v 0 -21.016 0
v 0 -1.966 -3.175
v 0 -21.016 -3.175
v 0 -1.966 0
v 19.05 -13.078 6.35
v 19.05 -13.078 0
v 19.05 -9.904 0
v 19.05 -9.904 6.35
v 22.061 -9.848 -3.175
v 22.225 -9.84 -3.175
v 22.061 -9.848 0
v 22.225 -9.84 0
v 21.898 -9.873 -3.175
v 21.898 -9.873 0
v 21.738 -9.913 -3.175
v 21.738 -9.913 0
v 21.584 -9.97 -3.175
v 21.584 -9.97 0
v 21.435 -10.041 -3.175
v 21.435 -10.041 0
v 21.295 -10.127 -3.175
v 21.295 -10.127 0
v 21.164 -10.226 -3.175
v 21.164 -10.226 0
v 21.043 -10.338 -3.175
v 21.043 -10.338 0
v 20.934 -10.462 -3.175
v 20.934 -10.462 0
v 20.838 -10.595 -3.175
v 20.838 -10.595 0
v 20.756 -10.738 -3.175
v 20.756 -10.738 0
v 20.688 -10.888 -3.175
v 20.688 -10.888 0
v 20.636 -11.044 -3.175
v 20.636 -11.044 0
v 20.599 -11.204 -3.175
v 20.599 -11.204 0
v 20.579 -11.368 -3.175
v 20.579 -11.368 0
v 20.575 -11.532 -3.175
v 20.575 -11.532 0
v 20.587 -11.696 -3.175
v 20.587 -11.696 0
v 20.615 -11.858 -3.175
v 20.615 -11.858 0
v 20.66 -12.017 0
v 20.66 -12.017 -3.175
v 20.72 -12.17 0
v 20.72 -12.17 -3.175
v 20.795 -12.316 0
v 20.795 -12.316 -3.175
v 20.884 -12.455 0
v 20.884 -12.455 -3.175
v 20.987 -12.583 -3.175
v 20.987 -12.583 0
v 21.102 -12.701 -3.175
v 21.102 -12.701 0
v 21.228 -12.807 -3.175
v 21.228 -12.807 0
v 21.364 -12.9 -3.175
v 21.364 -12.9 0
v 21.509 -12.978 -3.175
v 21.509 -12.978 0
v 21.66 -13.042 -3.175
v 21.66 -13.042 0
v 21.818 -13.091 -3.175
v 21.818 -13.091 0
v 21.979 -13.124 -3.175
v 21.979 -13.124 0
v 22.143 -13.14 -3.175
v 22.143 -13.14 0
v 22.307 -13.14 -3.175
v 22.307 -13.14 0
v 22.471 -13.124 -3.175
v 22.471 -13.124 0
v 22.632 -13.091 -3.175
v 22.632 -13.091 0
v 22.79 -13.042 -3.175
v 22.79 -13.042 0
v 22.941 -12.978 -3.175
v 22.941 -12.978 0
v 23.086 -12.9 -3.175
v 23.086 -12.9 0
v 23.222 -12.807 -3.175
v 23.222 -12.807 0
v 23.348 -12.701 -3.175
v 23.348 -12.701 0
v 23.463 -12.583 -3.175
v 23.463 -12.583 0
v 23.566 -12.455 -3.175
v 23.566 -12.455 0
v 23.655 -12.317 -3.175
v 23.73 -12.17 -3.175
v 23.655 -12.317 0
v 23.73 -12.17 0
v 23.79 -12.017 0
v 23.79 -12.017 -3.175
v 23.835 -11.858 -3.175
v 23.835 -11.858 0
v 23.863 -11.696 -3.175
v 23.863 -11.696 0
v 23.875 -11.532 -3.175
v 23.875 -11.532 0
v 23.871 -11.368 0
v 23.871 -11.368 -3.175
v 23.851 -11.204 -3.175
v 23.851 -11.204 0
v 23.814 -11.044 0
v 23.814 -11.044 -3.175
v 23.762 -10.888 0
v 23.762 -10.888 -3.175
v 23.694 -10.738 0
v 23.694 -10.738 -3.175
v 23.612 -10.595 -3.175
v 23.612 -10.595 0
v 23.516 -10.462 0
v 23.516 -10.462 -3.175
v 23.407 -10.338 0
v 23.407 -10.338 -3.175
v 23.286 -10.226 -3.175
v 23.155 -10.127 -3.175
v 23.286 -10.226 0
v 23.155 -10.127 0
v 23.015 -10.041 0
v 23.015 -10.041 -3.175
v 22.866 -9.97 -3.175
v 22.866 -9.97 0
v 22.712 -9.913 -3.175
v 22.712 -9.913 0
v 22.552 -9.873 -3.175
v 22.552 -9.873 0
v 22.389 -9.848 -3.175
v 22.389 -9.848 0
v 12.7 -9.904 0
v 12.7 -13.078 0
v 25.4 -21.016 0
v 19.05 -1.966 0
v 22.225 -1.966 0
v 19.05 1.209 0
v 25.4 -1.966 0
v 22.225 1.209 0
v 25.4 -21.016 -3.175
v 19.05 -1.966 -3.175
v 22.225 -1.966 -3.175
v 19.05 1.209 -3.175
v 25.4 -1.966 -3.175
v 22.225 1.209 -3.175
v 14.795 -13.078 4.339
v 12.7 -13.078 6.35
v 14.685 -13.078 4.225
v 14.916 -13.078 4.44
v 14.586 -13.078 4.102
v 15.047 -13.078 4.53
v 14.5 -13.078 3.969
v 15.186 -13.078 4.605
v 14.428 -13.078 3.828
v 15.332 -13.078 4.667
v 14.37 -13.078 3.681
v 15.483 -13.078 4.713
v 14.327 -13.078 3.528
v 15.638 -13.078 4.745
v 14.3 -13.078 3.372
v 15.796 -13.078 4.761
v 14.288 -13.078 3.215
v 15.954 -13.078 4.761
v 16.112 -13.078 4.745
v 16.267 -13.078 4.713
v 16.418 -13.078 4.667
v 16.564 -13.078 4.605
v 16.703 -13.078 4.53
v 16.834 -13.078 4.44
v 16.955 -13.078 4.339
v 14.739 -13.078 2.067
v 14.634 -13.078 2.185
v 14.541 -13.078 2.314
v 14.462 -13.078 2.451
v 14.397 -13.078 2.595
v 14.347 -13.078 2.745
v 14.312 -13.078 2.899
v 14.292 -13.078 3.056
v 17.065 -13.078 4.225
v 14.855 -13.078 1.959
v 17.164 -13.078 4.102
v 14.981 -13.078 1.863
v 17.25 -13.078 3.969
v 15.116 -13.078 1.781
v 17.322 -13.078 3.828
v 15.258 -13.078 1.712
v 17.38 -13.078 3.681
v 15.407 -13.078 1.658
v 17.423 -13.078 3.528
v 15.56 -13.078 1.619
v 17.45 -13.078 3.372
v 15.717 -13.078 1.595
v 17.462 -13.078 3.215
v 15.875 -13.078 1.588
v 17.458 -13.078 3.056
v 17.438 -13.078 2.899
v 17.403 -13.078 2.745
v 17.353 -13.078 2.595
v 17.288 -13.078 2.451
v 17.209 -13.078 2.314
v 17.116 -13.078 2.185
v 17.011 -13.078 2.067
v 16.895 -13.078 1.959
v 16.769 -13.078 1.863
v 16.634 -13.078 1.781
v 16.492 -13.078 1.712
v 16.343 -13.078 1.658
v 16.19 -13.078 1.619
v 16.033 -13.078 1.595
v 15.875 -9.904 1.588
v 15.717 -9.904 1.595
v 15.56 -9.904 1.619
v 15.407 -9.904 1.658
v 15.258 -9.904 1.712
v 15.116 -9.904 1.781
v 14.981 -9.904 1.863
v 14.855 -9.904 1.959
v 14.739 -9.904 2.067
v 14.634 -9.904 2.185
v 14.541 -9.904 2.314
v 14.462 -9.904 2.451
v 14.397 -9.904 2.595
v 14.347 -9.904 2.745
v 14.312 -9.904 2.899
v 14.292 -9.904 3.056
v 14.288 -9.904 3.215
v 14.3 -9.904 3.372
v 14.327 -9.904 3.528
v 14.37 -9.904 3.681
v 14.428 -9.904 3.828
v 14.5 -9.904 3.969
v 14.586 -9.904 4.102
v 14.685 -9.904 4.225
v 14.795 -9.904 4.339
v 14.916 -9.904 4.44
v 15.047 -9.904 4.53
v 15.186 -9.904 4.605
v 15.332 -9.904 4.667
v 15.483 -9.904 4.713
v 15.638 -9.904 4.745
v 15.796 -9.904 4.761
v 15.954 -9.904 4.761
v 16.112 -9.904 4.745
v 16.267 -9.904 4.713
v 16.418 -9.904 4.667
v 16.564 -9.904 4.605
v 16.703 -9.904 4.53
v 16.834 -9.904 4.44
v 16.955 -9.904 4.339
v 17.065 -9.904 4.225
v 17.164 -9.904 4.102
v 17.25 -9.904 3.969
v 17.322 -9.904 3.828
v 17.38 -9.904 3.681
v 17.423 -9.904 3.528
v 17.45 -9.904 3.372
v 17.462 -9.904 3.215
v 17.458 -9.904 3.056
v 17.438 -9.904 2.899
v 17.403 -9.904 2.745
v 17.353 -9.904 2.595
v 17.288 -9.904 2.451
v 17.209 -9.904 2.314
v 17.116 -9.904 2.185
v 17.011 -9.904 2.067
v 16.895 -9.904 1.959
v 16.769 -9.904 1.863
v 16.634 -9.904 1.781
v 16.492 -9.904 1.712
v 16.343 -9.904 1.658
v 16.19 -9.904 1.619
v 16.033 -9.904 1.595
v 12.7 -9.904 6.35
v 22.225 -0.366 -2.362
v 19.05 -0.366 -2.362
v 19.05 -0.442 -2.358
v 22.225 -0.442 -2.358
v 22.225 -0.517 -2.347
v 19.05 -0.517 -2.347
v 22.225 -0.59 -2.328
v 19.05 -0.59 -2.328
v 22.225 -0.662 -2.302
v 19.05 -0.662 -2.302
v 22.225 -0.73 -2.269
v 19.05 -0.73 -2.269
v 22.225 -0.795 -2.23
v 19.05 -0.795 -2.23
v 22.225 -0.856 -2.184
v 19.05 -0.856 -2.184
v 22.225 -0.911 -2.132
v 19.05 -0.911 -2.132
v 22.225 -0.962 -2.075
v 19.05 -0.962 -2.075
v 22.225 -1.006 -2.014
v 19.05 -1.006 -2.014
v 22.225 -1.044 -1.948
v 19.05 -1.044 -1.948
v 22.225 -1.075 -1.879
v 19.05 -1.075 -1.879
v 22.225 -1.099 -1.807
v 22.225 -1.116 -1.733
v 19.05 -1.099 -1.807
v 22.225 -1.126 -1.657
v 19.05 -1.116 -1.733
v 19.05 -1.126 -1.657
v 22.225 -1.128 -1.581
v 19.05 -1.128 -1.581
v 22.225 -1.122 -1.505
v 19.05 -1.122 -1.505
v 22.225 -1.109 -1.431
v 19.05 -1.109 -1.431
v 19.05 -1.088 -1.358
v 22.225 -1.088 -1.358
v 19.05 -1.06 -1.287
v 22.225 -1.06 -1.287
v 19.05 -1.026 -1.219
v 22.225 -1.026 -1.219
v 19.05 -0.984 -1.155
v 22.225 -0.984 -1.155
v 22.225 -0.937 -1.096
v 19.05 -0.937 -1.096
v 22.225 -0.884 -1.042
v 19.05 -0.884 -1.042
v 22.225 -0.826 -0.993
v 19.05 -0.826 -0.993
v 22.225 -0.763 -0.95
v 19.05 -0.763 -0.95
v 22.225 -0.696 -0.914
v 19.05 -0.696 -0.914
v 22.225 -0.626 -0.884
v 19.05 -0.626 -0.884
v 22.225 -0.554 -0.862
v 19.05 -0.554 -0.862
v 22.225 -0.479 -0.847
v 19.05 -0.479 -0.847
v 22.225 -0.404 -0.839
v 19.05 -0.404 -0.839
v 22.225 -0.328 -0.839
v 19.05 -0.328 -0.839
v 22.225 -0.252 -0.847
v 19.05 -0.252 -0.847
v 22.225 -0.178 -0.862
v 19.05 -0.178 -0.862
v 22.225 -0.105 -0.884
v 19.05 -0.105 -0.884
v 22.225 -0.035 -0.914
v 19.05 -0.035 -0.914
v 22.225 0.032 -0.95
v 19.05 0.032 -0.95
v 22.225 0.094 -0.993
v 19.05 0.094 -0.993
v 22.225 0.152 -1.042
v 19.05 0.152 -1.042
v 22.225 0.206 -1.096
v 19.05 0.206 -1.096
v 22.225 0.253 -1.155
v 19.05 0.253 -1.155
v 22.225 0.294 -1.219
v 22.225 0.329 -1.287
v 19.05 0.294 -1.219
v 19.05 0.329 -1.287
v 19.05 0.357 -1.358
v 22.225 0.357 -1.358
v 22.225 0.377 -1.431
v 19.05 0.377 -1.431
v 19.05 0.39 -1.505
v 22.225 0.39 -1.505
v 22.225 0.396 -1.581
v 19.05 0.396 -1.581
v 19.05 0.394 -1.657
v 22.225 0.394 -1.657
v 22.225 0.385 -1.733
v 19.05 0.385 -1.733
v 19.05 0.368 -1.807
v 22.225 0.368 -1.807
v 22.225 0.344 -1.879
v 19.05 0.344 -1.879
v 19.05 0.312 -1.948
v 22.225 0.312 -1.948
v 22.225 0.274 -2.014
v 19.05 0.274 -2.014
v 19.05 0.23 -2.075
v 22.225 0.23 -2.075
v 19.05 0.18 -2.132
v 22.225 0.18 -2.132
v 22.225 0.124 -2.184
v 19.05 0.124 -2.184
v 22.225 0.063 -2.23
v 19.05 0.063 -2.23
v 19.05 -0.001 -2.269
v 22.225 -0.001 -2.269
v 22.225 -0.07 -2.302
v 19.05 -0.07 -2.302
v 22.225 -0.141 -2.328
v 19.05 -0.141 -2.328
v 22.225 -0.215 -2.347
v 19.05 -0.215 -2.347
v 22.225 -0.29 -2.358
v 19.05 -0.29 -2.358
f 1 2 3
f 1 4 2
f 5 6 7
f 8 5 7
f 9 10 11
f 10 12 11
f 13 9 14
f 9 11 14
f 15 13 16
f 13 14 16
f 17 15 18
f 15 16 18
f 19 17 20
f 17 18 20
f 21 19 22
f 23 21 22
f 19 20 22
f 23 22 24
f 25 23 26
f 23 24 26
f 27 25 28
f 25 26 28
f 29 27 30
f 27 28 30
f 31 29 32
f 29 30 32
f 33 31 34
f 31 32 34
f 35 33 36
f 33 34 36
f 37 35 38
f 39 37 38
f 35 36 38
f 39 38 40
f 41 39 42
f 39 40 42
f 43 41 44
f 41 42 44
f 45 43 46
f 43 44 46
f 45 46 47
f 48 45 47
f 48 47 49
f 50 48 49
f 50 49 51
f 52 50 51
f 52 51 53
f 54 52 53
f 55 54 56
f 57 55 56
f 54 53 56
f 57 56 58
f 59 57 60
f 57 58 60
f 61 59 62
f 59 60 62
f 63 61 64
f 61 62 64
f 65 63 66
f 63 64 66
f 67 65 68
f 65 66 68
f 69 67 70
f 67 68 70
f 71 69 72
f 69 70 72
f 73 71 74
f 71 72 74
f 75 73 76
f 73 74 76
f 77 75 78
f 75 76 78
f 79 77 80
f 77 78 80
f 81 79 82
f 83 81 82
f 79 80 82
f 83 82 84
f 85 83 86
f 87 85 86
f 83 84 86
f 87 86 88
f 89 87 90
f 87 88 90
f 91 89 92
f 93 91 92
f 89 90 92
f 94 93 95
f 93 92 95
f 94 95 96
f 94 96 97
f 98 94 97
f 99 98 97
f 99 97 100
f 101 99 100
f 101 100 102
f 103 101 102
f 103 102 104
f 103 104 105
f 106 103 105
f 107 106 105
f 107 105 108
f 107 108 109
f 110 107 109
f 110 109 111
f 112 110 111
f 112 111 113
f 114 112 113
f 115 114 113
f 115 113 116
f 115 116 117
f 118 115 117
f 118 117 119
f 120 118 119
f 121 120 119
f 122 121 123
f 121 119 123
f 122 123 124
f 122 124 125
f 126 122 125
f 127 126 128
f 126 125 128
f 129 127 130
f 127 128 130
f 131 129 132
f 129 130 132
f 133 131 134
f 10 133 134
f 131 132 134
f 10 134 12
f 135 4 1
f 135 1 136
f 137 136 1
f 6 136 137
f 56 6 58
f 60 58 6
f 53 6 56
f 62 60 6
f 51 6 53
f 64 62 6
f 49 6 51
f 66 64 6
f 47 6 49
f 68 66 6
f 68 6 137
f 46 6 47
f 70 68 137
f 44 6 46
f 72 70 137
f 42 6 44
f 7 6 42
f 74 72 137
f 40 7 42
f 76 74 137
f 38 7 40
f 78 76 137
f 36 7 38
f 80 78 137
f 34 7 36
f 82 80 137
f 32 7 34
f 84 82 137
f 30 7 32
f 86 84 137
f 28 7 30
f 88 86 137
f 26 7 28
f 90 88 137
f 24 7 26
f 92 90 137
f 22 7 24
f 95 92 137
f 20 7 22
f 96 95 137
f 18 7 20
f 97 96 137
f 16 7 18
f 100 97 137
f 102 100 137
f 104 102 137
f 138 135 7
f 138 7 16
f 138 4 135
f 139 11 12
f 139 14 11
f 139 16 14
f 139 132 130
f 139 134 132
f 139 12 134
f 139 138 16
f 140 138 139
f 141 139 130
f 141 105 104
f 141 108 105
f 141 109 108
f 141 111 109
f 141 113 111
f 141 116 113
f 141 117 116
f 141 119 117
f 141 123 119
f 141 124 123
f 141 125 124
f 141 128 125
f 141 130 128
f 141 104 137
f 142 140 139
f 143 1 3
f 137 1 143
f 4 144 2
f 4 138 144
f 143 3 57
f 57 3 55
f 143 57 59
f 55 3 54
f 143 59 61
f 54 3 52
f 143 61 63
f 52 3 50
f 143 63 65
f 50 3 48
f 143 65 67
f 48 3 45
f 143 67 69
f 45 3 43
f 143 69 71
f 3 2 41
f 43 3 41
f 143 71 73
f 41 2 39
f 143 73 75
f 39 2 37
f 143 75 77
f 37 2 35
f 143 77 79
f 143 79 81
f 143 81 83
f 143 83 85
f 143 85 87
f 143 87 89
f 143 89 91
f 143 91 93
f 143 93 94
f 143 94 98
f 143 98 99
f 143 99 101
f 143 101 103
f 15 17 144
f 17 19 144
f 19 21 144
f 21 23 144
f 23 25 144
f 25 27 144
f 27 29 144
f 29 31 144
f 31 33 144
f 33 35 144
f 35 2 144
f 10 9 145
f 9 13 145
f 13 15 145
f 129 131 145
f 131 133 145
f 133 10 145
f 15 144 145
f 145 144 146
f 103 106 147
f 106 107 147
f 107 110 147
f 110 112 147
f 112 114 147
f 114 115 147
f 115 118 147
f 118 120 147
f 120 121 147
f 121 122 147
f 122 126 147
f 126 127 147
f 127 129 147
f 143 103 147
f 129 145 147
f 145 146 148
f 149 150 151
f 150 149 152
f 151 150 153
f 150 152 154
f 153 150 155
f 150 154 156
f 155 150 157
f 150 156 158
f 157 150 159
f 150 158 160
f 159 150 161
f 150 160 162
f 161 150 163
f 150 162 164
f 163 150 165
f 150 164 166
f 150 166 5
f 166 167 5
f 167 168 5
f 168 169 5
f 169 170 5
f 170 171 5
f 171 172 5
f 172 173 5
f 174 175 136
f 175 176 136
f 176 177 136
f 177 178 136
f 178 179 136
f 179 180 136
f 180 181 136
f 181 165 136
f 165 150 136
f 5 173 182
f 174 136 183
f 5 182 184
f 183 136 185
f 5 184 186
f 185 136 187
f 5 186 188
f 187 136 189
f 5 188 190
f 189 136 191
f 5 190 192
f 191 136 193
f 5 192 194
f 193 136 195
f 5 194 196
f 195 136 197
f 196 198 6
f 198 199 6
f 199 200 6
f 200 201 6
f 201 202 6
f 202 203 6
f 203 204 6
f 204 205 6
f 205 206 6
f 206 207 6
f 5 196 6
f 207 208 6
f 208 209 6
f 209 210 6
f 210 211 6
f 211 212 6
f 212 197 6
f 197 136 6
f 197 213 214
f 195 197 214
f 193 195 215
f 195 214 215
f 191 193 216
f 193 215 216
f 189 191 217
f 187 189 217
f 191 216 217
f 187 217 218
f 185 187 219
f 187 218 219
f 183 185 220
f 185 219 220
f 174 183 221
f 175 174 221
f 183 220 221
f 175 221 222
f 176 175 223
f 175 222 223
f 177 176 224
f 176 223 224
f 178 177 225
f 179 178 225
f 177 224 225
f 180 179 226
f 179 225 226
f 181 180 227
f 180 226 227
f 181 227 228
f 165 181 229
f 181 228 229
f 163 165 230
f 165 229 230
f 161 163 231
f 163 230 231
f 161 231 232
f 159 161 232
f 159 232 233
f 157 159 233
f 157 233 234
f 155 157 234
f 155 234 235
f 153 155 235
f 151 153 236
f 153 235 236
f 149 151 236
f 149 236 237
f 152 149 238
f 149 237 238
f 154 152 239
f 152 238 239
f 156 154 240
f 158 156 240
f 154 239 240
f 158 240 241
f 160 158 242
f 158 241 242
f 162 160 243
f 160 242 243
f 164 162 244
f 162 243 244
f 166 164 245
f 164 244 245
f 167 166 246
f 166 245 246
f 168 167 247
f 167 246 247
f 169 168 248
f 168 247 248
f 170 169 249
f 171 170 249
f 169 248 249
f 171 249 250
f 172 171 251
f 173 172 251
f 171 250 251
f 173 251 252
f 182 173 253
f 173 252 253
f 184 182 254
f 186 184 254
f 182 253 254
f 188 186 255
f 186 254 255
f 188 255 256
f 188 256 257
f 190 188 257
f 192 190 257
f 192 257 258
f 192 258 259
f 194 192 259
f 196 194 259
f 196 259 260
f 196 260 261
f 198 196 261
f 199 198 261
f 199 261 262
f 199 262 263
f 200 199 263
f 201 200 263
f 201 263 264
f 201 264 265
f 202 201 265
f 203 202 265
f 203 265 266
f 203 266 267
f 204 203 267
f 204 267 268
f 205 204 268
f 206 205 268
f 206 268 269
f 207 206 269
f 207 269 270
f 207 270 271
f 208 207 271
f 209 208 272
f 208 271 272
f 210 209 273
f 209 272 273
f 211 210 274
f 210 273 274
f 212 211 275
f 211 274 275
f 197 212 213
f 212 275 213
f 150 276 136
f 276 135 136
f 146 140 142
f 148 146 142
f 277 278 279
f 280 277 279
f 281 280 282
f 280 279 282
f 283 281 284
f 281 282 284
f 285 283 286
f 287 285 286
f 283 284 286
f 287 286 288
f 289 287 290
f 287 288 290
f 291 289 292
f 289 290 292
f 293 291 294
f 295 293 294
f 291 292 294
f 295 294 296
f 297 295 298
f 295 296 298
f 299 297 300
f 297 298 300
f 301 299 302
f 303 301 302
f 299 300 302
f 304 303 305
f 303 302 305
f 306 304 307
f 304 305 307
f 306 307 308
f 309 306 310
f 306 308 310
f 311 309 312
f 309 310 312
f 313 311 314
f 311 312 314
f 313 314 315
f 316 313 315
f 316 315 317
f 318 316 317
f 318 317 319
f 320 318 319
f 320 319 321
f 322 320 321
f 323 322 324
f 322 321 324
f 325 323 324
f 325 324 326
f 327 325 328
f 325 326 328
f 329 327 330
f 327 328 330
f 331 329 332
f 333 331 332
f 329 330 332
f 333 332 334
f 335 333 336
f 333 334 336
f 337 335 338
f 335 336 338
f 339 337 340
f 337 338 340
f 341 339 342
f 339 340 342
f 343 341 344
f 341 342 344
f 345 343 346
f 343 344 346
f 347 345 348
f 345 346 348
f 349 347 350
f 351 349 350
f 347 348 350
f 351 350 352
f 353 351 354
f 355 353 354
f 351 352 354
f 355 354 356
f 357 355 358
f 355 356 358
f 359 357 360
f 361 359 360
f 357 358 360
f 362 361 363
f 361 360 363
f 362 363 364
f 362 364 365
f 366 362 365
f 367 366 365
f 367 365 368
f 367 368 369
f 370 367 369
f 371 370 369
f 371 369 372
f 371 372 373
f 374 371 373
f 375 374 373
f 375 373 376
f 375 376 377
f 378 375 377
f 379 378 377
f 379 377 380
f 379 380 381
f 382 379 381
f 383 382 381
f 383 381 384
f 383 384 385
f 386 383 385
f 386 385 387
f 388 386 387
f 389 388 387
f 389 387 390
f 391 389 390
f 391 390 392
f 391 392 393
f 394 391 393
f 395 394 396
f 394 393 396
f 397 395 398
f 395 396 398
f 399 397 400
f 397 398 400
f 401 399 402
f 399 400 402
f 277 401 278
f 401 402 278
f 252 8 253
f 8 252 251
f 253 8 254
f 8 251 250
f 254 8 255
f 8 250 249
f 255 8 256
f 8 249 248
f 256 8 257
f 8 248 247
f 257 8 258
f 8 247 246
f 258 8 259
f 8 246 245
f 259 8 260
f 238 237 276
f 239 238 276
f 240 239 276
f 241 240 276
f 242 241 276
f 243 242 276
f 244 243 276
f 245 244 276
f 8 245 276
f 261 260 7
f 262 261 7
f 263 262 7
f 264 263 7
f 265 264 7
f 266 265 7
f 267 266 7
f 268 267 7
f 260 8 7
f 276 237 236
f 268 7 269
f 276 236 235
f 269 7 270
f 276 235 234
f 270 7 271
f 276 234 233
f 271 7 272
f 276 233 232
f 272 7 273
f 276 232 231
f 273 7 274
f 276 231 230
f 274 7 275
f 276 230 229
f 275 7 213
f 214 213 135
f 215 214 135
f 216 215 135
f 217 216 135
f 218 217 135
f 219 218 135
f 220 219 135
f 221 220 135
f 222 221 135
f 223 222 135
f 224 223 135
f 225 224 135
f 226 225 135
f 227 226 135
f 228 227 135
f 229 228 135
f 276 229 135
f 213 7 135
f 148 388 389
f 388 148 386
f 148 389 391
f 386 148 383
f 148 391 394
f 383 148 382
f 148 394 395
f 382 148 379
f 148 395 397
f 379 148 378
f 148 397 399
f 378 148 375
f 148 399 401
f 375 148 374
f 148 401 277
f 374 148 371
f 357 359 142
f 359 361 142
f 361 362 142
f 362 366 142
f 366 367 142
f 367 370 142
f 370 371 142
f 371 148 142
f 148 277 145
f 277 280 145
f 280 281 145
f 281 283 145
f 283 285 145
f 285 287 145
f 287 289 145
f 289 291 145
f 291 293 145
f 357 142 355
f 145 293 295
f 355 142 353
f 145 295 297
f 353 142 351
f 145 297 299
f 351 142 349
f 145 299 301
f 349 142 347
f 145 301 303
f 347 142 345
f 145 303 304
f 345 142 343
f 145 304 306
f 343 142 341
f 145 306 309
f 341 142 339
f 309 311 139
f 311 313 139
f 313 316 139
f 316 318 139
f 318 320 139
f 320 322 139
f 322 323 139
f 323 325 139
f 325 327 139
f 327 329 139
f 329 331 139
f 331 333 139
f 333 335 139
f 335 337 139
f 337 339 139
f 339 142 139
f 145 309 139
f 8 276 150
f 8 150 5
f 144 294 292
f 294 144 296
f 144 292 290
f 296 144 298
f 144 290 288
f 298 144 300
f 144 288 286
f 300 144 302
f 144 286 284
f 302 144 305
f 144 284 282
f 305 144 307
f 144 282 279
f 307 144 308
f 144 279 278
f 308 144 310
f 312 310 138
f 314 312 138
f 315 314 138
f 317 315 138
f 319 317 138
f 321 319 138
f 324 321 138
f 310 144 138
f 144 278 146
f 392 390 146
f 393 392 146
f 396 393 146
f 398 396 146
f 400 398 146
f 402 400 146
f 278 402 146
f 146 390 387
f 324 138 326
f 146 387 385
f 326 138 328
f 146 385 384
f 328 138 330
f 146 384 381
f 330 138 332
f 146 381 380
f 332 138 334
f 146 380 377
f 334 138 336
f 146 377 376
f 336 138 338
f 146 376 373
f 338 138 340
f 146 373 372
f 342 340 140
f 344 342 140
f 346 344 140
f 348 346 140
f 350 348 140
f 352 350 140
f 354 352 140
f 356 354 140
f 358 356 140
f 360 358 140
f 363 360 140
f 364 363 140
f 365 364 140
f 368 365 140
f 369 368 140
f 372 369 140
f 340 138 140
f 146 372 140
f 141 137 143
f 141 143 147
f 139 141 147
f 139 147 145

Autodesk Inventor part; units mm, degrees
ref_plane "YZ Plane" through (0, 0, 0) normal (1, 0, 0) x (0, 1, 0)
ref_plane "XZ Plane" through (0, 0, 0) normal (0, 1, 0) x (-1, 0, 0)
ref_plane "XY Plane" through (0, 0, 0) normal (0, 0, 1) x (1, 0, 0)
sketch "Sketch1" plane through (0, 0, 0) normal (0, 0, 1) x (1, 0, 0)
  line L0 (0, -21.016) -> (25.4, -21.016)
  line L1 (25.4, -21.016) -> (25.4, -1.966)
  line L2 (0, -1.966) -> (0, -21.016)
  line L3 (19.05, -1.966) -> (19.05, 15.687)
  line L4 (19.05, 15.687) -> (22.225, 15.687)
  line L5 (22.225, 15.687) -> (22.225, -1.966)
  line L6 (25.4, -1.966) -> (22.225, -1.966)
  line L7 (19.05, -1.966) -> (0, -1.966)
  dimension "d0" = 19.05
  dimension "d2" = 25.4
  dimension "d3" = 3.175
  dimension "d4" = 17.653
  dimension "d22" = 3.175
extrude "Extrusion1" add sketch "Sketch1" against normal blind 3.175
sketch "Sketch2" plane through (0, 0, 0) normal (0, 0, 1) x (1, 0, 0)
  line L0 (12.7, -13.0785) -> (19.05, -13.0785)
  line L1 (19.05, -13.0785) -> (19.05, -9.9035)
  line L2 (19.05, -9.9035) -> (12.7, -9.9035)
  line L3 (12.7, -9.9035) -> (12.7, -13.0785)
  line L4 (0, -1.966) -> (0, -21.016) projected
  line L5 (25.4, -1.966) -> (22.225, -1.966) projected
  line L6 (25.4, -21.016) -> (25.4, -1.966) projected
  dimension "d7" = 3.175
  dimension "d10" = 6.35
  dimension "d11" = 7.9375
  dimension "d12" = 6.35
extrude "Extrusion2" add sketch "Sketch2" along normal blind 6.35
sketch "Sketch3" plane through (22.225, -1.966, 0) normal (1, 0, 0) x (0, 0, -1)
  line L0 (0, 0) -> (0, 17.653) projected
  line L1 (0, 0) -> (3.175, 0) projected
  line L2 (3.175, 17.653) -> (3.175, 0) projected
  line L3 (0, 17.653) -> (3.175, 17.653) projected
  point P0 (1.5537, 16.0528)
  dimension "d38" = 1.6002
hole "Hole1" at (22.225, 14.0868, -1.5537) direction (-1, 0, 0) diameter 1.524 end through all
sketch "Sketch4" plane through (12.7, -13.0785, 0) normal (0, -1, 0) x (1, 0, 0)
  line L0 (6.35, 0) -> (0, 0) projected
  line L1 (6.35, 0) -> (6.35, 6.35) projected
  line L2 (0, 6.35) -> (6.35, 6.35) projected
  line L3 (0, 0) -> (0, 6.35) projected
  point P0 (3.175, 3.175)
hole "Hole2" at (15.875, -13.0785, 3.175) direction (0, 1, 0) diameter 3.175 end through all
sketch "Sketch5" plane through (0, 0, -3.175) normal (0, 0, -1) x (-1, 0, 0)
  line L0 (-25.4, -21.016) -> (0, -21.016) projected
  line L1 (0, -21.016) -> (0, -1.966) projected
  line L2 (0, -1.966) -> (-19.05, -1.966) projected
  line L3 (-19.05, -1.966) -> (-19.05, 15.687) projected
  line L4 (-19.05, 15.687) -> (-22.225, 15.687) projected
  line L5 (-22.225, 15.687) -> (-22.225, -1.966) projected
  line L6 (-22.225, -1.966) -> (-25.4, -1.966) projected
  line L7 (-25.4, -1.966) -> (-25.4, -21.016) projected
  point P0 (-22.225, -11.491)
  point P1 (-5.3321, 2.987)
  dimension "d37" = 3.175
hole "Hole3" at (5.3321, 2.987, -3.175) at (22.225, -11.491, -3.175) direction (0, 0, 1) diameter 3.302 end through all thread size "8-32 UNC" class "2B" standard "ANSI Unified Screw Threads"
sketch "Sketch6" plane through (22.225, -1.966, 0) normal (1, 0, 0) x (0, 0, -1)
  point P0 (0, 1.966)
hole "Hole4" at (22.225, -0.3658, -1.6002) direction (-1, 0, 0) diameter 1.524 end through all
thicken "Thicken1" operation add thickness 14.478 both sides no extend neighbours yes toward (0, -1, 0) faces at (21.1667, 15.687, -1.0583)
equation "\"d11\" = -0.5 * d7 + 0.5 * d0"
properties part number "slide pivot plate"
